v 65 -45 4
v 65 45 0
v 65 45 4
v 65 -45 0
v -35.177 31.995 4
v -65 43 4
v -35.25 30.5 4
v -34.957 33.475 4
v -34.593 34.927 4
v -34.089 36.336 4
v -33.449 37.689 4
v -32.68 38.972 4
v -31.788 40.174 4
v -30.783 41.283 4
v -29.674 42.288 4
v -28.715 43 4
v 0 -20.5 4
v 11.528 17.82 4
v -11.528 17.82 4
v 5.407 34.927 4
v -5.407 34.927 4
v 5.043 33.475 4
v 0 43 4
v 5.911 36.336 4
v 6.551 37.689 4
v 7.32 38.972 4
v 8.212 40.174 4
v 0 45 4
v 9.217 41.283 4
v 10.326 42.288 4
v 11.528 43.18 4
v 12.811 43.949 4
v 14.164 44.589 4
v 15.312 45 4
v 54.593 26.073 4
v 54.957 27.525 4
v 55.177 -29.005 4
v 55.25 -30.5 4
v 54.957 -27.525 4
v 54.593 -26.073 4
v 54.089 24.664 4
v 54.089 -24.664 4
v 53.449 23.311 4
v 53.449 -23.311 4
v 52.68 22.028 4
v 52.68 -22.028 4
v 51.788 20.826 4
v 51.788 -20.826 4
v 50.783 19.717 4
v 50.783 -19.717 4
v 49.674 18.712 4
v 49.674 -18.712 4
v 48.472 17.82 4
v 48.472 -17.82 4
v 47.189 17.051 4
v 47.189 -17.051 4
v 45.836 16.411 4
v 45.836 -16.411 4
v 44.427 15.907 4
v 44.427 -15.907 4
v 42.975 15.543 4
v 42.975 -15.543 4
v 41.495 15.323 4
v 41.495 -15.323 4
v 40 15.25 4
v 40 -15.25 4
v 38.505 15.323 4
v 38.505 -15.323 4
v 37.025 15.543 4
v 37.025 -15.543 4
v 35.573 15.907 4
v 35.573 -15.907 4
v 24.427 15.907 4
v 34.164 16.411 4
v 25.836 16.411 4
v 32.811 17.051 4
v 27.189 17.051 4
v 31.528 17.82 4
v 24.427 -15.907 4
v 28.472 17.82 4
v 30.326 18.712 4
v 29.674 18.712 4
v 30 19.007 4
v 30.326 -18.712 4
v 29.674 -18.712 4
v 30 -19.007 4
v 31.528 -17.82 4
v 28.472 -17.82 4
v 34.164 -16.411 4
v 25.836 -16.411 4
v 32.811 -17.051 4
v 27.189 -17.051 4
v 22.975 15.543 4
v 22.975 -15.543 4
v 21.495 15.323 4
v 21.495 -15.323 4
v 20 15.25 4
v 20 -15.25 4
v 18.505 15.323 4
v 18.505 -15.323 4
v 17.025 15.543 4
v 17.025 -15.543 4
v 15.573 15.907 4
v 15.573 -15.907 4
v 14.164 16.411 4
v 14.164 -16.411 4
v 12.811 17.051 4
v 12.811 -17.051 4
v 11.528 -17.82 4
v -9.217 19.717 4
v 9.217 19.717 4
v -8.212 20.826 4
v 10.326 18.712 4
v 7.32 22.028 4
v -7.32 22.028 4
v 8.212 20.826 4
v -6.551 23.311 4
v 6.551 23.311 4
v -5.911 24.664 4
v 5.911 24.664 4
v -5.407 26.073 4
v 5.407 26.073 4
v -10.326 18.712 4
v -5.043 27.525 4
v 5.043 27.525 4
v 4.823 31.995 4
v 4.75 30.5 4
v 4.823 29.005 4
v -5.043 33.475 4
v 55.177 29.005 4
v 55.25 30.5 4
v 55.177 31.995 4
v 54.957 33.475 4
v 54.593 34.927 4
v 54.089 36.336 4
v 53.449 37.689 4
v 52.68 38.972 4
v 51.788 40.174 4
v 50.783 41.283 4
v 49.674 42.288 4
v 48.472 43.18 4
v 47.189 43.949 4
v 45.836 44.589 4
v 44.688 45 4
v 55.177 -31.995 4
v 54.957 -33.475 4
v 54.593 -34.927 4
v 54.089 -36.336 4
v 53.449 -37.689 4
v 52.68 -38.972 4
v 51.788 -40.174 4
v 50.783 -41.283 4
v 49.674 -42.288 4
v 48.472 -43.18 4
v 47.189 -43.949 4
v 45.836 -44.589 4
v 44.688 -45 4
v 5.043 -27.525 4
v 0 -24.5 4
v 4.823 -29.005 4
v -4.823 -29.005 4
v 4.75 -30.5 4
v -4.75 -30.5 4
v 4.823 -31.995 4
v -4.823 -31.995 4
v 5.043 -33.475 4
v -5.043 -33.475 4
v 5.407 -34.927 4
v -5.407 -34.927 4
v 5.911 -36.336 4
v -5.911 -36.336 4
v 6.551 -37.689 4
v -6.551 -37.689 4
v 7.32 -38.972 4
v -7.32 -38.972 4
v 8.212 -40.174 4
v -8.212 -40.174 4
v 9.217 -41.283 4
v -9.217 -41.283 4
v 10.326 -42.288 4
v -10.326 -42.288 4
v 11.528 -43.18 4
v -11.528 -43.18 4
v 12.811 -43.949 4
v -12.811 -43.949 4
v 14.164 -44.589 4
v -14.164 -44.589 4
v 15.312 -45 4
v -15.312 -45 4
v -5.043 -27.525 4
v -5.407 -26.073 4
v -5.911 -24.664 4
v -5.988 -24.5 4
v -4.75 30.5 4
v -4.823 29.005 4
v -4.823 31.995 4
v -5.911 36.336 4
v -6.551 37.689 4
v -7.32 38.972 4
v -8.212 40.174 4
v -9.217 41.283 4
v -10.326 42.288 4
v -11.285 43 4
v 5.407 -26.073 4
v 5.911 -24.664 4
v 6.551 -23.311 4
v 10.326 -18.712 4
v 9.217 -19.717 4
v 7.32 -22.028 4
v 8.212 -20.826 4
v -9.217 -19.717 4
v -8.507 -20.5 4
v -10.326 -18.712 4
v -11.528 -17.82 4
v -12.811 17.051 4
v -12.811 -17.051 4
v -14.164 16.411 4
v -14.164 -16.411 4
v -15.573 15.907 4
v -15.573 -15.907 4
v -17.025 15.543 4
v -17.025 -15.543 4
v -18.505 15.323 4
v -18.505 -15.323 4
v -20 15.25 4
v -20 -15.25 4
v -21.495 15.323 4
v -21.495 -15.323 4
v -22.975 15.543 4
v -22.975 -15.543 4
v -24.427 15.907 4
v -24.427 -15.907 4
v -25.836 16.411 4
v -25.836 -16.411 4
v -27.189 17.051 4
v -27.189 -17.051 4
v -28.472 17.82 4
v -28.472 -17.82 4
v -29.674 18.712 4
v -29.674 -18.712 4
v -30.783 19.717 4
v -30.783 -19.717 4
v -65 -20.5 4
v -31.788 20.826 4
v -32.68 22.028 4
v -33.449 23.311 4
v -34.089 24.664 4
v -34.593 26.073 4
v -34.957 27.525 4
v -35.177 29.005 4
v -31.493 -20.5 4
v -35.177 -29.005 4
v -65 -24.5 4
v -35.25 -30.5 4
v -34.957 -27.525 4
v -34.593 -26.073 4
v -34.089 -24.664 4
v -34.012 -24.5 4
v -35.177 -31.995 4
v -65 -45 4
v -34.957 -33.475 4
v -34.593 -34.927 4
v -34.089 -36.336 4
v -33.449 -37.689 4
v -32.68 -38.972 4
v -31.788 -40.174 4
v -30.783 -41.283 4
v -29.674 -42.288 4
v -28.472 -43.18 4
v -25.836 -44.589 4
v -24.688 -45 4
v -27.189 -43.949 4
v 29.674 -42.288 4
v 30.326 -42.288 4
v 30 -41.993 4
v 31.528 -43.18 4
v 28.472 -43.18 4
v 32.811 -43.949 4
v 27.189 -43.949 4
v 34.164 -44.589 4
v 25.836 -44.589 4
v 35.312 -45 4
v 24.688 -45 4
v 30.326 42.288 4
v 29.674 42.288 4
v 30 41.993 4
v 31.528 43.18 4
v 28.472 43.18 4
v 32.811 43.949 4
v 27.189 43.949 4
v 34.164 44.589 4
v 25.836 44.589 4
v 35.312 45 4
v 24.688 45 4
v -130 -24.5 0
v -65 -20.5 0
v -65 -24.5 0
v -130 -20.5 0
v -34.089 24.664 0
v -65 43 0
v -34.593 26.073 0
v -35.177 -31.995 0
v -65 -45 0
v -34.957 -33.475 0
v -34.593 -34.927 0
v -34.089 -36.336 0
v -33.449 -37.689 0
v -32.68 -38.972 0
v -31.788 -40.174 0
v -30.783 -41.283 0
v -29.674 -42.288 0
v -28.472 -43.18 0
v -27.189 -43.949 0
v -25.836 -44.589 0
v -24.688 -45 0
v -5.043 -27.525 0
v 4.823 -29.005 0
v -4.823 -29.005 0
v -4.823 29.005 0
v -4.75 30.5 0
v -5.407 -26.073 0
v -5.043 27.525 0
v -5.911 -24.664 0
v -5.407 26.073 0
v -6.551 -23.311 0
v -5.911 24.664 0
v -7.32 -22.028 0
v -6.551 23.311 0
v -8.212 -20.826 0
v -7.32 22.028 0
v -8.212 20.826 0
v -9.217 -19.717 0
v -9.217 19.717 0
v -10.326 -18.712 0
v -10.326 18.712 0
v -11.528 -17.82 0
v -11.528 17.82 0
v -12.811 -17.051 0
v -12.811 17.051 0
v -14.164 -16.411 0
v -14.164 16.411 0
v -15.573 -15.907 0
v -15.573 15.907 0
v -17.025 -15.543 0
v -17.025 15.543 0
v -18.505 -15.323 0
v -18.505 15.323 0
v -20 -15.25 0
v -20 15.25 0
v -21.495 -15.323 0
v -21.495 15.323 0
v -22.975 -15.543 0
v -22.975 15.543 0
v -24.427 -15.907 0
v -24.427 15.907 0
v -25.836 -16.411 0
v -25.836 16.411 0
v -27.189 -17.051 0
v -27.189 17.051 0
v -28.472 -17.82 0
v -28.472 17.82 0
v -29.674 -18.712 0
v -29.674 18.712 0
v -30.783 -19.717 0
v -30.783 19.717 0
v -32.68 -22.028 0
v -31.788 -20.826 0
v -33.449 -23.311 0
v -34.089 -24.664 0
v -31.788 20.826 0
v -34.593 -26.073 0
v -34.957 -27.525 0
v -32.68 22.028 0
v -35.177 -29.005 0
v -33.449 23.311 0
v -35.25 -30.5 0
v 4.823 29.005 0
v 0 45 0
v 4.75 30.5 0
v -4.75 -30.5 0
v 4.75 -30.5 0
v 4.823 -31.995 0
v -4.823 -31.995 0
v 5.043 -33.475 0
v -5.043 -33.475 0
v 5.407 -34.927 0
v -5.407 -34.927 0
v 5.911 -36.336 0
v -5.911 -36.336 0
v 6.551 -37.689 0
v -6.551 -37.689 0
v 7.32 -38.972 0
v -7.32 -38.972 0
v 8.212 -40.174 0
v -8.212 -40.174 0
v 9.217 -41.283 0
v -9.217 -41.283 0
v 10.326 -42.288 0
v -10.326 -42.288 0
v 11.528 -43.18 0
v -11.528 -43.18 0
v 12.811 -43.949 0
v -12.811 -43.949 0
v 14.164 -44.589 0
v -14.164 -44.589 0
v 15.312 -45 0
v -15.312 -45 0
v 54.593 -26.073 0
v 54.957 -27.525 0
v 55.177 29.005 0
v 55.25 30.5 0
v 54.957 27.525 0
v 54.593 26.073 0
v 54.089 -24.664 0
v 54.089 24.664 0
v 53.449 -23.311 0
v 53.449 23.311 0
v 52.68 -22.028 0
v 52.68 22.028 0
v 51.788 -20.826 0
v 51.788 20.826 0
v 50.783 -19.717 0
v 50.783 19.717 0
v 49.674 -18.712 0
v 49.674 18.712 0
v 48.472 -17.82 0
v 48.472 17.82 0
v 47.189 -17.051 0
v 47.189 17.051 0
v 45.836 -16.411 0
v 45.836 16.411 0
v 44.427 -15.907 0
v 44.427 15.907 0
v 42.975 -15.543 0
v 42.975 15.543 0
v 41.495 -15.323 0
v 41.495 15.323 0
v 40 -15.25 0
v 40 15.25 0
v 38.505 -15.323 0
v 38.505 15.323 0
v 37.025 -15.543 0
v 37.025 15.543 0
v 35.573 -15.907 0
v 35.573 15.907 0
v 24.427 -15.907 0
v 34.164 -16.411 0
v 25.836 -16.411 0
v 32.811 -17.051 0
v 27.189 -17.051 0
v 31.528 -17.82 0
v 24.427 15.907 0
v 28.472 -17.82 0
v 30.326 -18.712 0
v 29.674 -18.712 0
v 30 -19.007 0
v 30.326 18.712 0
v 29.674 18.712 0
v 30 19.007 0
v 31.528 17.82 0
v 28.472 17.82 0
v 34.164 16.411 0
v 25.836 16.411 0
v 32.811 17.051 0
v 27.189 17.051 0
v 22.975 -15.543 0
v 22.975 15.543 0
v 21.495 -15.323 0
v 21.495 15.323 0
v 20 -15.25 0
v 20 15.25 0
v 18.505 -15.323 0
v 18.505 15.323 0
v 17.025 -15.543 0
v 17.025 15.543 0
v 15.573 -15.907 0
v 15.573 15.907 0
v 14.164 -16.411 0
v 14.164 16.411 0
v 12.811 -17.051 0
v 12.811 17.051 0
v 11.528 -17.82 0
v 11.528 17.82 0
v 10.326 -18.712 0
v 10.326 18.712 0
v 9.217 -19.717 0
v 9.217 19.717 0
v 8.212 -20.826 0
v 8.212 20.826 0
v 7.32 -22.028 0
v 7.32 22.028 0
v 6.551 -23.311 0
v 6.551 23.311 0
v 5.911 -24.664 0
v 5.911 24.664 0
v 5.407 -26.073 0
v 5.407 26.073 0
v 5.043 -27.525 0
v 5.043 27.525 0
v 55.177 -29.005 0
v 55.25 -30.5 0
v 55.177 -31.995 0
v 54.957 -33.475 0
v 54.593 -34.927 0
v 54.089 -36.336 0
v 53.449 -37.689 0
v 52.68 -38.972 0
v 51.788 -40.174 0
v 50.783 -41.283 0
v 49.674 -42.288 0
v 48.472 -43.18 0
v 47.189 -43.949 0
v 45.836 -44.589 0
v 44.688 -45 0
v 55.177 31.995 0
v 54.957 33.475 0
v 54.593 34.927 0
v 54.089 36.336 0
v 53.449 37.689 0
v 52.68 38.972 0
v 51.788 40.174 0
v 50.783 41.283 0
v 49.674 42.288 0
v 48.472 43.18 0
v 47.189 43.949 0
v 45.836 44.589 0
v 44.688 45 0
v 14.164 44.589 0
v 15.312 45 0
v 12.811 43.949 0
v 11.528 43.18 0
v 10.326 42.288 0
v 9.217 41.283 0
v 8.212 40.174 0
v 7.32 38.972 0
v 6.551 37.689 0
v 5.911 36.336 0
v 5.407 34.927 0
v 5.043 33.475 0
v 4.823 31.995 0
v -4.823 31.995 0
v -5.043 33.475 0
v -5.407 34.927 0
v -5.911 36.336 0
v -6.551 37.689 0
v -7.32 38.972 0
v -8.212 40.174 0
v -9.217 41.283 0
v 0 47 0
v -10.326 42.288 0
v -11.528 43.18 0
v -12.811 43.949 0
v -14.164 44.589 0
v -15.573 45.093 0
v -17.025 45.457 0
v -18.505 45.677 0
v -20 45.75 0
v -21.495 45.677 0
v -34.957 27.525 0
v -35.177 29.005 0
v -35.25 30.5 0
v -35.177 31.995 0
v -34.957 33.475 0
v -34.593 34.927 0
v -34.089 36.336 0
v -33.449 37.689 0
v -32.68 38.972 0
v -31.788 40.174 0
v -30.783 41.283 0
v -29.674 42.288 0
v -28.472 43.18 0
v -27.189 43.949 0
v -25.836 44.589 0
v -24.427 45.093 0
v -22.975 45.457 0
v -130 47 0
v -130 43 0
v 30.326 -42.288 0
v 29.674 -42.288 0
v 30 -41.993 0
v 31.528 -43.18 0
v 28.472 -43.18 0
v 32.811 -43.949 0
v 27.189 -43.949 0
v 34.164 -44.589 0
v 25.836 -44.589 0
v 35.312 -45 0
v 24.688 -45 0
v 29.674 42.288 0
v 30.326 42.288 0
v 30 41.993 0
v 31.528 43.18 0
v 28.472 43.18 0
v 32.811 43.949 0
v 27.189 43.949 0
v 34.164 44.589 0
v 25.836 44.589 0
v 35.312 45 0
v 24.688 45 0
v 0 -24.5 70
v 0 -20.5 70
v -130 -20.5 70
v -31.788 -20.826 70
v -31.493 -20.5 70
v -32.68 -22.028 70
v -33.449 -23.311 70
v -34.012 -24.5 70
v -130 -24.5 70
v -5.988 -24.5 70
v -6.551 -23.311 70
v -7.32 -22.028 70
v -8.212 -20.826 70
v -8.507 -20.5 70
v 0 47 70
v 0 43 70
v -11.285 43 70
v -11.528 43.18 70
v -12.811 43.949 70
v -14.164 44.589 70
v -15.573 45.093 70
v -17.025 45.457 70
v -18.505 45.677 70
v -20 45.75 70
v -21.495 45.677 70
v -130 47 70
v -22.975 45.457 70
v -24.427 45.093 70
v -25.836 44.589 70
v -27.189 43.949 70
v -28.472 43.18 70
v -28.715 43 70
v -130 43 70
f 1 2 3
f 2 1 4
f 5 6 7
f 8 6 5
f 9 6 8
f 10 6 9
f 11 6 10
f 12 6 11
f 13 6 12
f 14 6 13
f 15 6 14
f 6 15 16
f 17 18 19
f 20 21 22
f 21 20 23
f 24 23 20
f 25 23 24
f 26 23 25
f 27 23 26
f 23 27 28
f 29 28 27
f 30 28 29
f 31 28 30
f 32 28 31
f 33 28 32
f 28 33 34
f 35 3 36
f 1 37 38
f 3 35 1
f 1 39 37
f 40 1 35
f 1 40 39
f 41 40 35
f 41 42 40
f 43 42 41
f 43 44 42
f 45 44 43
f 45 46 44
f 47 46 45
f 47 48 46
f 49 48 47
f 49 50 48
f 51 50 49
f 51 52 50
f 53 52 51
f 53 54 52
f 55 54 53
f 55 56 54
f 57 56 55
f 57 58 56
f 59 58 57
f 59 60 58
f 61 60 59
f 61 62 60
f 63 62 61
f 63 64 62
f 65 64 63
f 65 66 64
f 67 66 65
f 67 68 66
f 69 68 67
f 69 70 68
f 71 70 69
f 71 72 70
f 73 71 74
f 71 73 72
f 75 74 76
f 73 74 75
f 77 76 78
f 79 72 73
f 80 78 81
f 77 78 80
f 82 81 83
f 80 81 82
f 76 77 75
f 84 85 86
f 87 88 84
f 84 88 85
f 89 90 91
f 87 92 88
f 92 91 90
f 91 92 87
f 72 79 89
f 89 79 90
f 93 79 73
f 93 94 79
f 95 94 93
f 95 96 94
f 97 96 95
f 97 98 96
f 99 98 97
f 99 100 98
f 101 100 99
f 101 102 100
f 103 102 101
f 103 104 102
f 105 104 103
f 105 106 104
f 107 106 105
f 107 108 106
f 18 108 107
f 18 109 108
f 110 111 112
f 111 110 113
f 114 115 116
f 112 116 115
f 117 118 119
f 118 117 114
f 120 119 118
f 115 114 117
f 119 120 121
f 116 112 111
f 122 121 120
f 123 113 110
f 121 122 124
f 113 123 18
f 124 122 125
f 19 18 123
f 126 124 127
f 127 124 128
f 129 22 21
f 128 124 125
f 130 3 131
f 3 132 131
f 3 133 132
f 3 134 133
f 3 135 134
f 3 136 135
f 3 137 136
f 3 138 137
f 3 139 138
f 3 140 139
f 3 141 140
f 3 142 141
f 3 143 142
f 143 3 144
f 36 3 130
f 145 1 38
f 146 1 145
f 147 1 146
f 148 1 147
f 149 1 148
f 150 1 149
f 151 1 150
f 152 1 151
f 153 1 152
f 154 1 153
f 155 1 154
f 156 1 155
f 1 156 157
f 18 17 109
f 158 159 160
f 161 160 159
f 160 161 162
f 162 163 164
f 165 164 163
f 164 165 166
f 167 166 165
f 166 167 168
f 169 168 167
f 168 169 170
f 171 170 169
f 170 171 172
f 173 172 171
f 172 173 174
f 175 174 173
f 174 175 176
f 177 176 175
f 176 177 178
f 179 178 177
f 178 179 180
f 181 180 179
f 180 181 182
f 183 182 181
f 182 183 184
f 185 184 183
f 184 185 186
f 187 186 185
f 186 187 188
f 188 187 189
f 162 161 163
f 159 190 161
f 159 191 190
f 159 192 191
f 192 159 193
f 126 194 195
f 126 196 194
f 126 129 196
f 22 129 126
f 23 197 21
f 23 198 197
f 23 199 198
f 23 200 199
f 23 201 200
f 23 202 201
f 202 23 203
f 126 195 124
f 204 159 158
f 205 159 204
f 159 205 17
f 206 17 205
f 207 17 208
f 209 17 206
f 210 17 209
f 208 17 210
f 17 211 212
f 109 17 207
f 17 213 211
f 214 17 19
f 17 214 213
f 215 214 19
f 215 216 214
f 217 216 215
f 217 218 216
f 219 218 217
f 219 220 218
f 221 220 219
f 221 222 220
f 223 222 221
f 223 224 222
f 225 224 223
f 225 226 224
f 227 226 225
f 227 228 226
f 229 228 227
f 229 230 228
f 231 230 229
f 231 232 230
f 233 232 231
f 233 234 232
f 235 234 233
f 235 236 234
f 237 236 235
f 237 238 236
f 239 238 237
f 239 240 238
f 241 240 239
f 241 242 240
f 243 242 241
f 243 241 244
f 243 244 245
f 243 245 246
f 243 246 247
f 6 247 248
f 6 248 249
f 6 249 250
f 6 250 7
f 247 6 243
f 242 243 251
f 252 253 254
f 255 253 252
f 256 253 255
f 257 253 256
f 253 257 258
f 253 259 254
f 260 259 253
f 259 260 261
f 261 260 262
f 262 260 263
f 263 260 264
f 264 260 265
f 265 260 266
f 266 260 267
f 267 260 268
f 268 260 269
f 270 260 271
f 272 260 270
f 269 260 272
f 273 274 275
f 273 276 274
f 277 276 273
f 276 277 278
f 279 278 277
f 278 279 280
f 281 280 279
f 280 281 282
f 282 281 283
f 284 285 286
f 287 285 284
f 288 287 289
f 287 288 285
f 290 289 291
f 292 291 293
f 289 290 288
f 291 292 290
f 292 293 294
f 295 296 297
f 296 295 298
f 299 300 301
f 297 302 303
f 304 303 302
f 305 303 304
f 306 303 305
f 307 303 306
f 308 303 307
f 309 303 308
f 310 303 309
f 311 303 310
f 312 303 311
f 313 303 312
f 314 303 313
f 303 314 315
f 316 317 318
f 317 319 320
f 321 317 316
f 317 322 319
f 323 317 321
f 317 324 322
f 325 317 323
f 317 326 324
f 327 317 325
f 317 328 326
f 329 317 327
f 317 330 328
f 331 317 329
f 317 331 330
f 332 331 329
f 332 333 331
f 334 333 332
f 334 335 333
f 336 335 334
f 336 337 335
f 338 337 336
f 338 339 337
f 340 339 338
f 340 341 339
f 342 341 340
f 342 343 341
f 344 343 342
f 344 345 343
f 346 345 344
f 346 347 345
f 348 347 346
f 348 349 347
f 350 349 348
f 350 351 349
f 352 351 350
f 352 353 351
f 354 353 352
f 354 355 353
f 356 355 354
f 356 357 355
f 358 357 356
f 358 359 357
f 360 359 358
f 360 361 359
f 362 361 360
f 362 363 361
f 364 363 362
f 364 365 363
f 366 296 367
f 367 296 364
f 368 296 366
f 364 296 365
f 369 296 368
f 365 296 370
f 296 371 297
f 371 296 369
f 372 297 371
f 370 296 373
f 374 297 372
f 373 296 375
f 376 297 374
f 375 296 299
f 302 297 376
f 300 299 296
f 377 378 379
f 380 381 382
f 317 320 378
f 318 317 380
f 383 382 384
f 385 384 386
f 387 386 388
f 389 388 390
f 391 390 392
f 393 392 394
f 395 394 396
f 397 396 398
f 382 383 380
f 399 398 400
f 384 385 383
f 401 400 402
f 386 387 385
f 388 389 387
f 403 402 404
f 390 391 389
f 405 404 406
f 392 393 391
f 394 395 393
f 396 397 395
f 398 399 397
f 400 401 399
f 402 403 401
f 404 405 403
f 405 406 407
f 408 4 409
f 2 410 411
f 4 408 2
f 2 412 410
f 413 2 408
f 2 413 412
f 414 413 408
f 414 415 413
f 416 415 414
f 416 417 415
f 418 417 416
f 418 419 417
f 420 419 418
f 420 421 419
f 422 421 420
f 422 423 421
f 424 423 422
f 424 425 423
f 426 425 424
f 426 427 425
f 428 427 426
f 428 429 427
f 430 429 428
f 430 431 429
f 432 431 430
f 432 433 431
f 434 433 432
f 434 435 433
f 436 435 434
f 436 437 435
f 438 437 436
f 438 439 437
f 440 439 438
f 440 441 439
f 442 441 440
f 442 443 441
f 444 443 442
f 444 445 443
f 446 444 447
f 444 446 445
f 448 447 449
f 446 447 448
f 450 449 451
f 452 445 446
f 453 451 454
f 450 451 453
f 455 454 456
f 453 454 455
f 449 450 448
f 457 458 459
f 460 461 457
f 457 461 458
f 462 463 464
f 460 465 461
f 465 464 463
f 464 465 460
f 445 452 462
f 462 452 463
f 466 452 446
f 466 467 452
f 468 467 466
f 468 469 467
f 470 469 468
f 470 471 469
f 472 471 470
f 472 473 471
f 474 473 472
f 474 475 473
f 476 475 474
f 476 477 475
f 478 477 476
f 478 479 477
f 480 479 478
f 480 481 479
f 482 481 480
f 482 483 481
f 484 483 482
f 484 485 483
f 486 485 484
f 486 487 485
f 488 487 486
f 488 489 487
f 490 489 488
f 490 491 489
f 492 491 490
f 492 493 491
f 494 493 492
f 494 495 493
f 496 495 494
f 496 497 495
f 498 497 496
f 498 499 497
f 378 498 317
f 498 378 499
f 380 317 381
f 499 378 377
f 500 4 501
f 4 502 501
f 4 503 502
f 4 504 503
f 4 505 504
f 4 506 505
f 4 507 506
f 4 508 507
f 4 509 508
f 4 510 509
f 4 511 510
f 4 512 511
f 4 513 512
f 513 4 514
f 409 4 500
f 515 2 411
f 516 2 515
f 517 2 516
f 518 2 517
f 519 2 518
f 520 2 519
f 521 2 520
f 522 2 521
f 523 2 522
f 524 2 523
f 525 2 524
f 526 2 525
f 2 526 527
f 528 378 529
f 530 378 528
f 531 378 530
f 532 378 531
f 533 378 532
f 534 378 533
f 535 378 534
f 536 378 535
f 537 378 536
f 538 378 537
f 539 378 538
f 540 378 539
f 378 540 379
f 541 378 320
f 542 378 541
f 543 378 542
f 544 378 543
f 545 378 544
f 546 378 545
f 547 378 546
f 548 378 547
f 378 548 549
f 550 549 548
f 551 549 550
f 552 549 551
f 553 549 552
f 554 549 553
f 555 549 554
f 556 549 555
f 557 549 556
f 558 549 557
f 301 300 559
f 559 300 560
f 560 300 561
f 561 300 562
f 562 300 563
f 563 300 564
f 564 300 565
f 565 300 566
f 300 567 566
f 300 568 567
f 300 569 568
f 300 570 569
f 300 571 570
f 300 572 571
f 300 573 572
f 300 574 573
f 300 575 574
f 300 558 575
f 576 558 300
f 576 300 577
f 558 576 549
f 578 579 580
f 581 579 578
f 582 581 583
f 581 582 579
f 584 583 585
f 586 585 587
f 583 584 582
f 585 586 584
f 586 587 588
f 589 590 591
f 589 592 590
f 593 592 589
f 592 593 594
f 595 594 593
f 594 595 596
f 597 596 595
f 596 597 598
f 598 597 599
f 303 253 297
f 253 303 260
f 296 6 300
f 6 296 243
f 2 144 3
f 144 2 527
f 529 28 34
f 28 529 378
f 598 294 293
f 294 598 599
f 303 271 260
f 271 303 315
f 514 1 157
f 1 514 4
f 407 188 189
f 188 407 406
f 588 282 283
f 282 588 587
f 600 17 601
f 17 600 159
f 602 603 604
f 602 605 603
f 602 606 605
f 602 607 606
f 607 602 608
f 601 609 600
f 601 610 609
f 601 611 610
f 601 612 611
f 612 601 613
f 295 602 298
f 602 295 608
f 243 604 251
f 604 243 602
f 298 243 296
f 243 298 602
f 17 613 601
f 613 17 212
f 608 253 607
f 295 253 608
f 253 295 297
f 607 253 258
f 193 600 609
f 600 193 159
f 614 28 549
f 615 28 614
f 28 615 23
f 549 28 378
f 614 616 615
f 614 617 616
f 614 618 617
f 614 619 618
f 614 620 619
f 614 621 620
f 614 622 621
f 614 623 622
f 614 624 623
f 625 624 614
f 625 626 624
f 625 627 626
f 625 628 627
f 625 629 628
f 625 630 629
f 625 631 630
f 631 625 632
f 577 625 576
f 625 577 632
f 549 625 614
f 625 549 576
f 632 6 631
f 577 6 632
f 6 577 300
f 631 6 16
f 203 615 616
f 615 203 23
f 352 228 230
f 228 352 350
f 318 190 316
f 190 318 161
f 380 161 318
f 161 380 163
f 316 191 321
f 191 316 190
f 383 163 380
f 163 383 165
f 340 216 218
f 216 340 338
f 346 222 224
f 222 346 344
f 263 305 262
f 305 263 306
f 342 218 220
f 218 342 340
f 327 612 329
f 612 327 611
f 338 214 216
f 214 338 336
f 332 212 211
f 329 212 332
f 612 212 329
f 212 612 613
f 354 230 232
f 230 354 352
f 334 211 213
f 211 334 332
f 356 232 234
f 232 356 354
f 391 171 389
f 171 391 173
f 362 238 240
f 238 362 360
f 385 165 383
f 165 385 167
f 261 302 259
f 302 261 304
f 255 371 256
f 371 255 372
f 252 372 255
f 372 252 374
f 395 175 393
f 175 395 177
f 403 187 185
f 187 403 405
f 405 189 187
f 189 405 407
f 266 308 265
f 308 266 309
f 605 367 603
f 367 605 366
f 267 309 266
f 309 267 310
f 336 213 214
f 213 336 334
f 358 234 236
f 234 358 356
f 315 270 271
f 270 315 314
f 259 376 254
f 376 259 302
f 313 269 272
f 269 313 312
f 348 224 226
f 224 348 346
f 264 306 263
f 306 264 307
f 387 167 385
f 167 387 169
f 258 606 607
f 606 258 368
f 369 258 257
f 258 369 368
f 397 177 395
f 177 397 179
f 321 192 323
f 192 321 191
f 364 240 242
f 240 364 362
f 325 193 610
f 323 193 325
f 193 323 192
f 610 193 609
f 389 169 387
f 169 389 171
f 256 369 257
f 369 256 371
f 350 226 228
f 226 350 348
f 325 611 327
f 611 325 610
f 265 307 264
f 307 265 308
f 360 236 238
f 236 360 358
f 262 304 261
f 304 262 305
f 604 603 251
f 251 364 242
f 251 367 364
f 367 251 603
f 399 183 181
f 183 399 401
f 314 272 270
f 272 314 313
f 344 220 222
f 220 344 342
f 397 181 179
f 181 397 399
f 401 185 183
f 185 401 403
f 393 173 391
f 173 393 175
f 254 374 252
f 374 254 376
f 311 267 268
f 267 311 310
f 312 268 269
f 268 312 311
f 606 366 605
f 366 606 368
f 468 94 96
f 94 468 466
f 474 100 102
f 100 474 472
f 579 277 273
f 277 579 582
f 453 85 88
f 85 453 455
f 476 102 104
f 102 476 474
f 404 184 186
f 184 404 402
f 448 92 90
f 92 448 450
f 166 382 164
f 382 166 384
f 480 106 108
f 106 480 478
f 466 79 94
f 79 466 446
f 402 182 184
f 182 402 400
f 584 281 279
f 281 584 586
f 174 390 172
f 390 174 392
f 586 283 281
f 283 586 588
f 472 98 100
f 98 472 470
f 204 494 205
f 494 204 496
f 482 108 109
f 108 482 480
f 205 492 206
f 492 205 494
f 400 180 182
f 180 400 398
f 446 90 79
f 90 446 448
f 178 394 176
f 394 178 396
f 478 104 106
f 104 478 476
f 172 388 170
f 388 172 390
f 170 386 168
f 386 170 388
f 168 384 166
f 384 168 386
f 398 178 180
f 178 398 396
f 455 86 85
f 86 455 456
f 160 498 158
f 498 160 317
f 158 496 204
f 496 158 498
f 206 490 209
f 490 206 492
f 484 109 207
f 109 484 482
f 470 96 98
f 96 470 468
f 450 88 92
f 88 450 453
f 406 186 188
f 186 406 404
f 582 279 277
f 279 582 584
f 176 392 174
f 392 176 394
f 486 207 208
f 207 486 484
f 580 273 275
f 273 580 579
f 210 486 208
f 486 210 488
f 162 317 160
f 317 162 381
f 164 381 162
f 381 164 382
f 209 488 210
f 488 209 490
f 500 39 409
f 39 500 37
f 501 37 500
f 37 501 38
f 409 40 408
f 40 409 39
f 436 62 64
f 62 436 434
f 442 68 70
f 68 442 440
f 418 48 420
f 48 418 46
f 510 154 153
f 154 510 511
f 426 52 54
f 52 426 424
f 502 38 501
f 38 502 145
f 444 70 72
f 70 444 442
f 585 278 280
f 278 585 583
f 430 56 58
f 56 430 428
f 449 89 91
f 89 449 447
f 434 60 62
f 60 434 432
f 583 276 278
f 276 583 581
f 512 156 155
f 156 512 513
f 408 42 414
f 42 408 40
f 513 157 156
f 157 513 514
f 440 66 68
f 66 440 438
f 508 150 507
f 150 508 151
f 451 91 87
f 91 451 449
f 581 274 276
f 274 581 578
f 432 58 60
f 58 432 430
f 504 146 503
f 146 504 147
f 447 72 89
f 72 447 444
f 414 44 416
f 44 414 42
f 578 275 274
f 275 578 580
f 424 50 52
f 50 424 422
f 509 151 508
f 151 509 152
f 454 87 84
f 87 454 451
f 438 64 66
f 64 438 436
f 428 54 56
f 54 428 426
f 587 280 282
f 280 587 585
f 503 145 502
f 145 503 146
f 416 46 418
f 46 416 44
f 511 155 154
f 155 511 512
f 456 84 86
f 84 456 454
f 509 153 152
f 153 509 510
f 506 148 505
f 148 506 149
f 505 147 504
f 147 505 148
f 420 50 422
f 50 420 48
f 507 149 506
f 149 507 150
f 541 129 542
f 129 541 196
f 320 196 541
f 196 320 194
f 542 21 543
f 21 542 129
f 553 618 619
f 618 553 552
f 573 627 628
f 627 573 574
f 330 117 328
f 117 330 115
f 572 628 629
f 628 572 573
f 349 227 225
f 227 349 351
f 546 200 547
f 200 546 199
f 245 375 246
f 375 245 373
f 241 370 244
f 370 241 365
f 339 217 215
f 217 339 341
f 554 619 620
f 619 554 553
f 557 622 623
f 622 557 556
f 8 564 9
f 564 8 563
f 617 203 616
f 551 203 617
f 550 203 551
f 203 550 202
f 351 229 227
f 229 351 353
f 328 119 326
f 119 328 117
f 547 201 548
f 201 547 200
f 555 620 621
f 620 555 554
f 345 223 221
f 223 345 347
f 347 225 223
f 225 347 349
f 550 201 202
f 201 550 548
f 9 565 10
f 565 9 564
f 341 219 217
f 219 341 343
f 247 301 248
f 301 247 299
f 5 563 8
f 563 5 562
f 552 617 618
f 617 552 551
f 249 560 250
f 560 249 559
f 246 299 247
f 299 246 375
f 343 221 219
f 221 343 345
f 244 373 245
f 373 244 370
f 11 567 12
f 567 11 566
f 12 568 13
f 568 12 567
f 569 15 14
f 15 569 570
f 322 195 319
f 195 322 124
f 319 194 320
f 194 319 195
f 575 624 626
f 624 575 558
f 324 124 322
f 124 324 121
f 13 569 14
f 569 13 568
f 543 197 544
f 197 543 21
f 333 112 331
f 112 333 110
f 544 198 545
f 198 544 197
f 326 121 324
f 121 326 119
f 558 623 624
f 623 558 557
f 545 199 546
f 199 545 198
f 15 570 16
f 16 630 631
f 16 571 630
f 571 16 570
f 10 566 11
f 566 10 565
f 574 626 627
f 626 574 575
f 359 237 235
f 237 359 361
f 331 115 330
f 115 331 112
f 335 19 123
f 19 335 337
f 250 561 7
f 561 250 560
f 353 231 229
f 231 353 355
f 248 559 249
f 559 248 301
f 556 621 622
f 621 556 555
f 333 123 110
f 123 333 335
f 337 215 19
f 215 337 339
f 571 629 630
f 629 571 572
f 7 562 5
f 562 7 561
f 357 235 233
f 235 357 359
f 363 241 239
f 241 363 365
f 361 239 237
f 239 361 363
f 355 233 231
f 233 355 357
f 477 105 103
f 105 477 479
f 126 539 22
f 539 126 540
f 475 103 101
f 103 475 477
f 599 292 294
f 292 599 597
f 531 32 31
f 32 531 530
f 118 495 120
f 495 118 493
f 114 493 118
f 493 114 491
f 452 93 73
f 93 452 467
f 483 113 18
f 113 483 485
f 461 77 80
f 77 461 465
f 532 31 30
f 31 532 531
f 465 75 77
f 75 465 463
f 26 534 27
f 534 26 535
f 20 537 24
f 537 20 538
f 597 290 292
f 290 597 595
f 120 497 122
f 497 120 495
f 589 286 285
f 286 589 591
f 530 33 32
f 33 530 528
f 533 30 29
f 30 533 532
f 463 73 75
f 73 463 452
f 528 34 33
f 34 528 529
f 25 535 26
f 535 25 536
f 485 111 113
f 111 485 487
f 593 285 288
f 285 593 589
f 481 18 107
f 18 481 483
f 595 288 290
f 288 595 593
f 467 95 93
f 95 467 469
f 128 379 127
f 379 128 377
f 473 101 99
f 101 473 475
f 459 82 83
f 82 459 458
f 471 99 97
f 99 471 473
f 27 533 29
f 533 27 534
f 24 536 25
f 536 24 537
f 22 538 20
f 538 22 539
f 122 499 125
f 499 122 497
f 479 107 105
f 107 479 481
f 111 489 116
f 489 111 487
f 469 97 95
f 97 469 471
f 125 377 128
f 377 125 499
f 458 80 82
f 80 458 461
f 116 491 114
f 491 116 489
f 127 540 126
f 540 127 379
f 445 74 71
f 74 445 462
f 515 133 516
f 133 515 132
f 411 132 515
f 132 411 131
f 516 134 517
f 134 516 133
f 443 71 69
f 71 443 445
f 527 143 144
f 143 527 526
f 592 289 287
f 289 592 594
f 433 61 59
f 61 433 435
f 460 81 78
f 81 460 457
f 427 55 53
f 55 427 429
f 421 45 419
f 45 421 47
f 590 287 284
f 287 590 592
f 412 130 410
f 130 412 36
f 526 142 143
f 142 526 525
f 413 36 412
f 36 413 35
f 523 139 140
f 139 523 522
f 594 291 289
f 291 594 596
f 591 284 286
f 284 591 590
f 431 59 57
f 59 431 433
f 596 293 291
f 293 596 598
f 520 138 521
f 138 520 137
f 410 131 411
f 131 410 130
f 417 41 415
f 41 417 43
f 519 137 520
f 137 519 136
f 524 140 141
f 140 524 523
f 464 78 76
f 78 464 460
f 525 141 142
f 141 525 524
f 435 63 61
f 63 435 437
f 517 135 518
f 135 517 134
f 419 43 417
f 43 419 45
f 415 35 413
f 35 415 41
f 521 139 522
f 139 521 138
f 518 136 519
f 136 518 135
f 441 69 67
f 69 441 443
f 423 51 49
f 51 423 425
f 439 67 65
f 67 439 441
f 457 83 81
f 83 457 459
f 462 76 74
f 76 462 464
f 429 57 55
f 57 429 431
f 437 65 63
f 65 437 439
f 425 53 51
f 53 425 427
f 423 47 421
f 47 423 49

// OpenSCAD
// Built by bench/smallmodels/features/compiler.py from a list of features.
$fn = 64;
difference() {
  union() {
    translate([0, 0, 0]) translate([-65, -45, 0]) cube([130, 90, 4]);
    translate([-65, -22.5, 0]) translate([-65, -2, 0]) cube([130, 4, 70]);
    translate([-65, 45, 0]) translate([-65, -2, 0]) cube([130, 4, 70]);
  }
  union() {
    translate([-20, -30.5, -1]) rotate([0, 0, 0]) cylinder(d = 30.5, h = 72);
    translate([20, -30.5, -1]) rotate([0, 0, 0]) cylinder(d = 30.5, h = 72);
    translate([40, -30.5, -1]) rotate([0, 0, 0]) cylinder(d = 30.5, h = 72);
    translate([-20, 30.5, -1]) rotate([0, 0, 0]) cylinder(d = 30.5, h = 72);
    translate([20, 30.5, -1]) rotate([0, 0, 0]) cylinder(d = 30.5, h = 72);
    translate([40, 30.5, -1]) rotate([0, 0, 0]) cylinder(d = 30.5, h = 72);
  }
}
